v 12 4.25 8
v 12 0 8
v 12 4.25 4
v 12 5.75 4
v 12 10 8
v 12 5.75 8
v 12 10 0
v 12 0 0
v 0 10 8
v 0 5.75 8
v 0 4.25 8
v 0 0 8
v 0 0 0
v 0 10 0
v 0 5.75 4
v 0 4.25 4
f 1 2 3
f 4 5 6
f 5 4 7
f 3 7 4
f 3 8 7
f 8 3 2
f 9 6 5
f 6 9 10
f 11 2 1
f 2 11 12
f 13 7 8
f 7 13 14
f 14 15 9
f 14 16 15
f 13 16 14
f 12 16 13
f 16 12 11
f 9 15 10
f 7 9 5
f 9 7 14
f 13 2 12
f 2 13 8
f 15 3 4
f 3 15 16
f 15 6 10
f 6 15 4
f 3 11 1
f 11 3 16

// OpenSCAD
$fn = 32;

// ----------------------------------------------------------------------
// Micro clip: slotted block, 5-20 mm class
// ----------------------------------------------------------------------

// --- parameters (mm) ---
block_l = 12;             // block length, X
block_w = 10;             // block width, Y
block_h = 8;              // block height, Z
slot_w = 1.5;             // slot width
slot_d = 4;               // slot depth from the top

difference() {
  cube([block_l, block_w, block_h]);
  translate([-1, block_w / 2 - slot_w / 2, block_h - slot_d])
    cube([block_l + 2, slot_w, slot_d + 1]);
}
